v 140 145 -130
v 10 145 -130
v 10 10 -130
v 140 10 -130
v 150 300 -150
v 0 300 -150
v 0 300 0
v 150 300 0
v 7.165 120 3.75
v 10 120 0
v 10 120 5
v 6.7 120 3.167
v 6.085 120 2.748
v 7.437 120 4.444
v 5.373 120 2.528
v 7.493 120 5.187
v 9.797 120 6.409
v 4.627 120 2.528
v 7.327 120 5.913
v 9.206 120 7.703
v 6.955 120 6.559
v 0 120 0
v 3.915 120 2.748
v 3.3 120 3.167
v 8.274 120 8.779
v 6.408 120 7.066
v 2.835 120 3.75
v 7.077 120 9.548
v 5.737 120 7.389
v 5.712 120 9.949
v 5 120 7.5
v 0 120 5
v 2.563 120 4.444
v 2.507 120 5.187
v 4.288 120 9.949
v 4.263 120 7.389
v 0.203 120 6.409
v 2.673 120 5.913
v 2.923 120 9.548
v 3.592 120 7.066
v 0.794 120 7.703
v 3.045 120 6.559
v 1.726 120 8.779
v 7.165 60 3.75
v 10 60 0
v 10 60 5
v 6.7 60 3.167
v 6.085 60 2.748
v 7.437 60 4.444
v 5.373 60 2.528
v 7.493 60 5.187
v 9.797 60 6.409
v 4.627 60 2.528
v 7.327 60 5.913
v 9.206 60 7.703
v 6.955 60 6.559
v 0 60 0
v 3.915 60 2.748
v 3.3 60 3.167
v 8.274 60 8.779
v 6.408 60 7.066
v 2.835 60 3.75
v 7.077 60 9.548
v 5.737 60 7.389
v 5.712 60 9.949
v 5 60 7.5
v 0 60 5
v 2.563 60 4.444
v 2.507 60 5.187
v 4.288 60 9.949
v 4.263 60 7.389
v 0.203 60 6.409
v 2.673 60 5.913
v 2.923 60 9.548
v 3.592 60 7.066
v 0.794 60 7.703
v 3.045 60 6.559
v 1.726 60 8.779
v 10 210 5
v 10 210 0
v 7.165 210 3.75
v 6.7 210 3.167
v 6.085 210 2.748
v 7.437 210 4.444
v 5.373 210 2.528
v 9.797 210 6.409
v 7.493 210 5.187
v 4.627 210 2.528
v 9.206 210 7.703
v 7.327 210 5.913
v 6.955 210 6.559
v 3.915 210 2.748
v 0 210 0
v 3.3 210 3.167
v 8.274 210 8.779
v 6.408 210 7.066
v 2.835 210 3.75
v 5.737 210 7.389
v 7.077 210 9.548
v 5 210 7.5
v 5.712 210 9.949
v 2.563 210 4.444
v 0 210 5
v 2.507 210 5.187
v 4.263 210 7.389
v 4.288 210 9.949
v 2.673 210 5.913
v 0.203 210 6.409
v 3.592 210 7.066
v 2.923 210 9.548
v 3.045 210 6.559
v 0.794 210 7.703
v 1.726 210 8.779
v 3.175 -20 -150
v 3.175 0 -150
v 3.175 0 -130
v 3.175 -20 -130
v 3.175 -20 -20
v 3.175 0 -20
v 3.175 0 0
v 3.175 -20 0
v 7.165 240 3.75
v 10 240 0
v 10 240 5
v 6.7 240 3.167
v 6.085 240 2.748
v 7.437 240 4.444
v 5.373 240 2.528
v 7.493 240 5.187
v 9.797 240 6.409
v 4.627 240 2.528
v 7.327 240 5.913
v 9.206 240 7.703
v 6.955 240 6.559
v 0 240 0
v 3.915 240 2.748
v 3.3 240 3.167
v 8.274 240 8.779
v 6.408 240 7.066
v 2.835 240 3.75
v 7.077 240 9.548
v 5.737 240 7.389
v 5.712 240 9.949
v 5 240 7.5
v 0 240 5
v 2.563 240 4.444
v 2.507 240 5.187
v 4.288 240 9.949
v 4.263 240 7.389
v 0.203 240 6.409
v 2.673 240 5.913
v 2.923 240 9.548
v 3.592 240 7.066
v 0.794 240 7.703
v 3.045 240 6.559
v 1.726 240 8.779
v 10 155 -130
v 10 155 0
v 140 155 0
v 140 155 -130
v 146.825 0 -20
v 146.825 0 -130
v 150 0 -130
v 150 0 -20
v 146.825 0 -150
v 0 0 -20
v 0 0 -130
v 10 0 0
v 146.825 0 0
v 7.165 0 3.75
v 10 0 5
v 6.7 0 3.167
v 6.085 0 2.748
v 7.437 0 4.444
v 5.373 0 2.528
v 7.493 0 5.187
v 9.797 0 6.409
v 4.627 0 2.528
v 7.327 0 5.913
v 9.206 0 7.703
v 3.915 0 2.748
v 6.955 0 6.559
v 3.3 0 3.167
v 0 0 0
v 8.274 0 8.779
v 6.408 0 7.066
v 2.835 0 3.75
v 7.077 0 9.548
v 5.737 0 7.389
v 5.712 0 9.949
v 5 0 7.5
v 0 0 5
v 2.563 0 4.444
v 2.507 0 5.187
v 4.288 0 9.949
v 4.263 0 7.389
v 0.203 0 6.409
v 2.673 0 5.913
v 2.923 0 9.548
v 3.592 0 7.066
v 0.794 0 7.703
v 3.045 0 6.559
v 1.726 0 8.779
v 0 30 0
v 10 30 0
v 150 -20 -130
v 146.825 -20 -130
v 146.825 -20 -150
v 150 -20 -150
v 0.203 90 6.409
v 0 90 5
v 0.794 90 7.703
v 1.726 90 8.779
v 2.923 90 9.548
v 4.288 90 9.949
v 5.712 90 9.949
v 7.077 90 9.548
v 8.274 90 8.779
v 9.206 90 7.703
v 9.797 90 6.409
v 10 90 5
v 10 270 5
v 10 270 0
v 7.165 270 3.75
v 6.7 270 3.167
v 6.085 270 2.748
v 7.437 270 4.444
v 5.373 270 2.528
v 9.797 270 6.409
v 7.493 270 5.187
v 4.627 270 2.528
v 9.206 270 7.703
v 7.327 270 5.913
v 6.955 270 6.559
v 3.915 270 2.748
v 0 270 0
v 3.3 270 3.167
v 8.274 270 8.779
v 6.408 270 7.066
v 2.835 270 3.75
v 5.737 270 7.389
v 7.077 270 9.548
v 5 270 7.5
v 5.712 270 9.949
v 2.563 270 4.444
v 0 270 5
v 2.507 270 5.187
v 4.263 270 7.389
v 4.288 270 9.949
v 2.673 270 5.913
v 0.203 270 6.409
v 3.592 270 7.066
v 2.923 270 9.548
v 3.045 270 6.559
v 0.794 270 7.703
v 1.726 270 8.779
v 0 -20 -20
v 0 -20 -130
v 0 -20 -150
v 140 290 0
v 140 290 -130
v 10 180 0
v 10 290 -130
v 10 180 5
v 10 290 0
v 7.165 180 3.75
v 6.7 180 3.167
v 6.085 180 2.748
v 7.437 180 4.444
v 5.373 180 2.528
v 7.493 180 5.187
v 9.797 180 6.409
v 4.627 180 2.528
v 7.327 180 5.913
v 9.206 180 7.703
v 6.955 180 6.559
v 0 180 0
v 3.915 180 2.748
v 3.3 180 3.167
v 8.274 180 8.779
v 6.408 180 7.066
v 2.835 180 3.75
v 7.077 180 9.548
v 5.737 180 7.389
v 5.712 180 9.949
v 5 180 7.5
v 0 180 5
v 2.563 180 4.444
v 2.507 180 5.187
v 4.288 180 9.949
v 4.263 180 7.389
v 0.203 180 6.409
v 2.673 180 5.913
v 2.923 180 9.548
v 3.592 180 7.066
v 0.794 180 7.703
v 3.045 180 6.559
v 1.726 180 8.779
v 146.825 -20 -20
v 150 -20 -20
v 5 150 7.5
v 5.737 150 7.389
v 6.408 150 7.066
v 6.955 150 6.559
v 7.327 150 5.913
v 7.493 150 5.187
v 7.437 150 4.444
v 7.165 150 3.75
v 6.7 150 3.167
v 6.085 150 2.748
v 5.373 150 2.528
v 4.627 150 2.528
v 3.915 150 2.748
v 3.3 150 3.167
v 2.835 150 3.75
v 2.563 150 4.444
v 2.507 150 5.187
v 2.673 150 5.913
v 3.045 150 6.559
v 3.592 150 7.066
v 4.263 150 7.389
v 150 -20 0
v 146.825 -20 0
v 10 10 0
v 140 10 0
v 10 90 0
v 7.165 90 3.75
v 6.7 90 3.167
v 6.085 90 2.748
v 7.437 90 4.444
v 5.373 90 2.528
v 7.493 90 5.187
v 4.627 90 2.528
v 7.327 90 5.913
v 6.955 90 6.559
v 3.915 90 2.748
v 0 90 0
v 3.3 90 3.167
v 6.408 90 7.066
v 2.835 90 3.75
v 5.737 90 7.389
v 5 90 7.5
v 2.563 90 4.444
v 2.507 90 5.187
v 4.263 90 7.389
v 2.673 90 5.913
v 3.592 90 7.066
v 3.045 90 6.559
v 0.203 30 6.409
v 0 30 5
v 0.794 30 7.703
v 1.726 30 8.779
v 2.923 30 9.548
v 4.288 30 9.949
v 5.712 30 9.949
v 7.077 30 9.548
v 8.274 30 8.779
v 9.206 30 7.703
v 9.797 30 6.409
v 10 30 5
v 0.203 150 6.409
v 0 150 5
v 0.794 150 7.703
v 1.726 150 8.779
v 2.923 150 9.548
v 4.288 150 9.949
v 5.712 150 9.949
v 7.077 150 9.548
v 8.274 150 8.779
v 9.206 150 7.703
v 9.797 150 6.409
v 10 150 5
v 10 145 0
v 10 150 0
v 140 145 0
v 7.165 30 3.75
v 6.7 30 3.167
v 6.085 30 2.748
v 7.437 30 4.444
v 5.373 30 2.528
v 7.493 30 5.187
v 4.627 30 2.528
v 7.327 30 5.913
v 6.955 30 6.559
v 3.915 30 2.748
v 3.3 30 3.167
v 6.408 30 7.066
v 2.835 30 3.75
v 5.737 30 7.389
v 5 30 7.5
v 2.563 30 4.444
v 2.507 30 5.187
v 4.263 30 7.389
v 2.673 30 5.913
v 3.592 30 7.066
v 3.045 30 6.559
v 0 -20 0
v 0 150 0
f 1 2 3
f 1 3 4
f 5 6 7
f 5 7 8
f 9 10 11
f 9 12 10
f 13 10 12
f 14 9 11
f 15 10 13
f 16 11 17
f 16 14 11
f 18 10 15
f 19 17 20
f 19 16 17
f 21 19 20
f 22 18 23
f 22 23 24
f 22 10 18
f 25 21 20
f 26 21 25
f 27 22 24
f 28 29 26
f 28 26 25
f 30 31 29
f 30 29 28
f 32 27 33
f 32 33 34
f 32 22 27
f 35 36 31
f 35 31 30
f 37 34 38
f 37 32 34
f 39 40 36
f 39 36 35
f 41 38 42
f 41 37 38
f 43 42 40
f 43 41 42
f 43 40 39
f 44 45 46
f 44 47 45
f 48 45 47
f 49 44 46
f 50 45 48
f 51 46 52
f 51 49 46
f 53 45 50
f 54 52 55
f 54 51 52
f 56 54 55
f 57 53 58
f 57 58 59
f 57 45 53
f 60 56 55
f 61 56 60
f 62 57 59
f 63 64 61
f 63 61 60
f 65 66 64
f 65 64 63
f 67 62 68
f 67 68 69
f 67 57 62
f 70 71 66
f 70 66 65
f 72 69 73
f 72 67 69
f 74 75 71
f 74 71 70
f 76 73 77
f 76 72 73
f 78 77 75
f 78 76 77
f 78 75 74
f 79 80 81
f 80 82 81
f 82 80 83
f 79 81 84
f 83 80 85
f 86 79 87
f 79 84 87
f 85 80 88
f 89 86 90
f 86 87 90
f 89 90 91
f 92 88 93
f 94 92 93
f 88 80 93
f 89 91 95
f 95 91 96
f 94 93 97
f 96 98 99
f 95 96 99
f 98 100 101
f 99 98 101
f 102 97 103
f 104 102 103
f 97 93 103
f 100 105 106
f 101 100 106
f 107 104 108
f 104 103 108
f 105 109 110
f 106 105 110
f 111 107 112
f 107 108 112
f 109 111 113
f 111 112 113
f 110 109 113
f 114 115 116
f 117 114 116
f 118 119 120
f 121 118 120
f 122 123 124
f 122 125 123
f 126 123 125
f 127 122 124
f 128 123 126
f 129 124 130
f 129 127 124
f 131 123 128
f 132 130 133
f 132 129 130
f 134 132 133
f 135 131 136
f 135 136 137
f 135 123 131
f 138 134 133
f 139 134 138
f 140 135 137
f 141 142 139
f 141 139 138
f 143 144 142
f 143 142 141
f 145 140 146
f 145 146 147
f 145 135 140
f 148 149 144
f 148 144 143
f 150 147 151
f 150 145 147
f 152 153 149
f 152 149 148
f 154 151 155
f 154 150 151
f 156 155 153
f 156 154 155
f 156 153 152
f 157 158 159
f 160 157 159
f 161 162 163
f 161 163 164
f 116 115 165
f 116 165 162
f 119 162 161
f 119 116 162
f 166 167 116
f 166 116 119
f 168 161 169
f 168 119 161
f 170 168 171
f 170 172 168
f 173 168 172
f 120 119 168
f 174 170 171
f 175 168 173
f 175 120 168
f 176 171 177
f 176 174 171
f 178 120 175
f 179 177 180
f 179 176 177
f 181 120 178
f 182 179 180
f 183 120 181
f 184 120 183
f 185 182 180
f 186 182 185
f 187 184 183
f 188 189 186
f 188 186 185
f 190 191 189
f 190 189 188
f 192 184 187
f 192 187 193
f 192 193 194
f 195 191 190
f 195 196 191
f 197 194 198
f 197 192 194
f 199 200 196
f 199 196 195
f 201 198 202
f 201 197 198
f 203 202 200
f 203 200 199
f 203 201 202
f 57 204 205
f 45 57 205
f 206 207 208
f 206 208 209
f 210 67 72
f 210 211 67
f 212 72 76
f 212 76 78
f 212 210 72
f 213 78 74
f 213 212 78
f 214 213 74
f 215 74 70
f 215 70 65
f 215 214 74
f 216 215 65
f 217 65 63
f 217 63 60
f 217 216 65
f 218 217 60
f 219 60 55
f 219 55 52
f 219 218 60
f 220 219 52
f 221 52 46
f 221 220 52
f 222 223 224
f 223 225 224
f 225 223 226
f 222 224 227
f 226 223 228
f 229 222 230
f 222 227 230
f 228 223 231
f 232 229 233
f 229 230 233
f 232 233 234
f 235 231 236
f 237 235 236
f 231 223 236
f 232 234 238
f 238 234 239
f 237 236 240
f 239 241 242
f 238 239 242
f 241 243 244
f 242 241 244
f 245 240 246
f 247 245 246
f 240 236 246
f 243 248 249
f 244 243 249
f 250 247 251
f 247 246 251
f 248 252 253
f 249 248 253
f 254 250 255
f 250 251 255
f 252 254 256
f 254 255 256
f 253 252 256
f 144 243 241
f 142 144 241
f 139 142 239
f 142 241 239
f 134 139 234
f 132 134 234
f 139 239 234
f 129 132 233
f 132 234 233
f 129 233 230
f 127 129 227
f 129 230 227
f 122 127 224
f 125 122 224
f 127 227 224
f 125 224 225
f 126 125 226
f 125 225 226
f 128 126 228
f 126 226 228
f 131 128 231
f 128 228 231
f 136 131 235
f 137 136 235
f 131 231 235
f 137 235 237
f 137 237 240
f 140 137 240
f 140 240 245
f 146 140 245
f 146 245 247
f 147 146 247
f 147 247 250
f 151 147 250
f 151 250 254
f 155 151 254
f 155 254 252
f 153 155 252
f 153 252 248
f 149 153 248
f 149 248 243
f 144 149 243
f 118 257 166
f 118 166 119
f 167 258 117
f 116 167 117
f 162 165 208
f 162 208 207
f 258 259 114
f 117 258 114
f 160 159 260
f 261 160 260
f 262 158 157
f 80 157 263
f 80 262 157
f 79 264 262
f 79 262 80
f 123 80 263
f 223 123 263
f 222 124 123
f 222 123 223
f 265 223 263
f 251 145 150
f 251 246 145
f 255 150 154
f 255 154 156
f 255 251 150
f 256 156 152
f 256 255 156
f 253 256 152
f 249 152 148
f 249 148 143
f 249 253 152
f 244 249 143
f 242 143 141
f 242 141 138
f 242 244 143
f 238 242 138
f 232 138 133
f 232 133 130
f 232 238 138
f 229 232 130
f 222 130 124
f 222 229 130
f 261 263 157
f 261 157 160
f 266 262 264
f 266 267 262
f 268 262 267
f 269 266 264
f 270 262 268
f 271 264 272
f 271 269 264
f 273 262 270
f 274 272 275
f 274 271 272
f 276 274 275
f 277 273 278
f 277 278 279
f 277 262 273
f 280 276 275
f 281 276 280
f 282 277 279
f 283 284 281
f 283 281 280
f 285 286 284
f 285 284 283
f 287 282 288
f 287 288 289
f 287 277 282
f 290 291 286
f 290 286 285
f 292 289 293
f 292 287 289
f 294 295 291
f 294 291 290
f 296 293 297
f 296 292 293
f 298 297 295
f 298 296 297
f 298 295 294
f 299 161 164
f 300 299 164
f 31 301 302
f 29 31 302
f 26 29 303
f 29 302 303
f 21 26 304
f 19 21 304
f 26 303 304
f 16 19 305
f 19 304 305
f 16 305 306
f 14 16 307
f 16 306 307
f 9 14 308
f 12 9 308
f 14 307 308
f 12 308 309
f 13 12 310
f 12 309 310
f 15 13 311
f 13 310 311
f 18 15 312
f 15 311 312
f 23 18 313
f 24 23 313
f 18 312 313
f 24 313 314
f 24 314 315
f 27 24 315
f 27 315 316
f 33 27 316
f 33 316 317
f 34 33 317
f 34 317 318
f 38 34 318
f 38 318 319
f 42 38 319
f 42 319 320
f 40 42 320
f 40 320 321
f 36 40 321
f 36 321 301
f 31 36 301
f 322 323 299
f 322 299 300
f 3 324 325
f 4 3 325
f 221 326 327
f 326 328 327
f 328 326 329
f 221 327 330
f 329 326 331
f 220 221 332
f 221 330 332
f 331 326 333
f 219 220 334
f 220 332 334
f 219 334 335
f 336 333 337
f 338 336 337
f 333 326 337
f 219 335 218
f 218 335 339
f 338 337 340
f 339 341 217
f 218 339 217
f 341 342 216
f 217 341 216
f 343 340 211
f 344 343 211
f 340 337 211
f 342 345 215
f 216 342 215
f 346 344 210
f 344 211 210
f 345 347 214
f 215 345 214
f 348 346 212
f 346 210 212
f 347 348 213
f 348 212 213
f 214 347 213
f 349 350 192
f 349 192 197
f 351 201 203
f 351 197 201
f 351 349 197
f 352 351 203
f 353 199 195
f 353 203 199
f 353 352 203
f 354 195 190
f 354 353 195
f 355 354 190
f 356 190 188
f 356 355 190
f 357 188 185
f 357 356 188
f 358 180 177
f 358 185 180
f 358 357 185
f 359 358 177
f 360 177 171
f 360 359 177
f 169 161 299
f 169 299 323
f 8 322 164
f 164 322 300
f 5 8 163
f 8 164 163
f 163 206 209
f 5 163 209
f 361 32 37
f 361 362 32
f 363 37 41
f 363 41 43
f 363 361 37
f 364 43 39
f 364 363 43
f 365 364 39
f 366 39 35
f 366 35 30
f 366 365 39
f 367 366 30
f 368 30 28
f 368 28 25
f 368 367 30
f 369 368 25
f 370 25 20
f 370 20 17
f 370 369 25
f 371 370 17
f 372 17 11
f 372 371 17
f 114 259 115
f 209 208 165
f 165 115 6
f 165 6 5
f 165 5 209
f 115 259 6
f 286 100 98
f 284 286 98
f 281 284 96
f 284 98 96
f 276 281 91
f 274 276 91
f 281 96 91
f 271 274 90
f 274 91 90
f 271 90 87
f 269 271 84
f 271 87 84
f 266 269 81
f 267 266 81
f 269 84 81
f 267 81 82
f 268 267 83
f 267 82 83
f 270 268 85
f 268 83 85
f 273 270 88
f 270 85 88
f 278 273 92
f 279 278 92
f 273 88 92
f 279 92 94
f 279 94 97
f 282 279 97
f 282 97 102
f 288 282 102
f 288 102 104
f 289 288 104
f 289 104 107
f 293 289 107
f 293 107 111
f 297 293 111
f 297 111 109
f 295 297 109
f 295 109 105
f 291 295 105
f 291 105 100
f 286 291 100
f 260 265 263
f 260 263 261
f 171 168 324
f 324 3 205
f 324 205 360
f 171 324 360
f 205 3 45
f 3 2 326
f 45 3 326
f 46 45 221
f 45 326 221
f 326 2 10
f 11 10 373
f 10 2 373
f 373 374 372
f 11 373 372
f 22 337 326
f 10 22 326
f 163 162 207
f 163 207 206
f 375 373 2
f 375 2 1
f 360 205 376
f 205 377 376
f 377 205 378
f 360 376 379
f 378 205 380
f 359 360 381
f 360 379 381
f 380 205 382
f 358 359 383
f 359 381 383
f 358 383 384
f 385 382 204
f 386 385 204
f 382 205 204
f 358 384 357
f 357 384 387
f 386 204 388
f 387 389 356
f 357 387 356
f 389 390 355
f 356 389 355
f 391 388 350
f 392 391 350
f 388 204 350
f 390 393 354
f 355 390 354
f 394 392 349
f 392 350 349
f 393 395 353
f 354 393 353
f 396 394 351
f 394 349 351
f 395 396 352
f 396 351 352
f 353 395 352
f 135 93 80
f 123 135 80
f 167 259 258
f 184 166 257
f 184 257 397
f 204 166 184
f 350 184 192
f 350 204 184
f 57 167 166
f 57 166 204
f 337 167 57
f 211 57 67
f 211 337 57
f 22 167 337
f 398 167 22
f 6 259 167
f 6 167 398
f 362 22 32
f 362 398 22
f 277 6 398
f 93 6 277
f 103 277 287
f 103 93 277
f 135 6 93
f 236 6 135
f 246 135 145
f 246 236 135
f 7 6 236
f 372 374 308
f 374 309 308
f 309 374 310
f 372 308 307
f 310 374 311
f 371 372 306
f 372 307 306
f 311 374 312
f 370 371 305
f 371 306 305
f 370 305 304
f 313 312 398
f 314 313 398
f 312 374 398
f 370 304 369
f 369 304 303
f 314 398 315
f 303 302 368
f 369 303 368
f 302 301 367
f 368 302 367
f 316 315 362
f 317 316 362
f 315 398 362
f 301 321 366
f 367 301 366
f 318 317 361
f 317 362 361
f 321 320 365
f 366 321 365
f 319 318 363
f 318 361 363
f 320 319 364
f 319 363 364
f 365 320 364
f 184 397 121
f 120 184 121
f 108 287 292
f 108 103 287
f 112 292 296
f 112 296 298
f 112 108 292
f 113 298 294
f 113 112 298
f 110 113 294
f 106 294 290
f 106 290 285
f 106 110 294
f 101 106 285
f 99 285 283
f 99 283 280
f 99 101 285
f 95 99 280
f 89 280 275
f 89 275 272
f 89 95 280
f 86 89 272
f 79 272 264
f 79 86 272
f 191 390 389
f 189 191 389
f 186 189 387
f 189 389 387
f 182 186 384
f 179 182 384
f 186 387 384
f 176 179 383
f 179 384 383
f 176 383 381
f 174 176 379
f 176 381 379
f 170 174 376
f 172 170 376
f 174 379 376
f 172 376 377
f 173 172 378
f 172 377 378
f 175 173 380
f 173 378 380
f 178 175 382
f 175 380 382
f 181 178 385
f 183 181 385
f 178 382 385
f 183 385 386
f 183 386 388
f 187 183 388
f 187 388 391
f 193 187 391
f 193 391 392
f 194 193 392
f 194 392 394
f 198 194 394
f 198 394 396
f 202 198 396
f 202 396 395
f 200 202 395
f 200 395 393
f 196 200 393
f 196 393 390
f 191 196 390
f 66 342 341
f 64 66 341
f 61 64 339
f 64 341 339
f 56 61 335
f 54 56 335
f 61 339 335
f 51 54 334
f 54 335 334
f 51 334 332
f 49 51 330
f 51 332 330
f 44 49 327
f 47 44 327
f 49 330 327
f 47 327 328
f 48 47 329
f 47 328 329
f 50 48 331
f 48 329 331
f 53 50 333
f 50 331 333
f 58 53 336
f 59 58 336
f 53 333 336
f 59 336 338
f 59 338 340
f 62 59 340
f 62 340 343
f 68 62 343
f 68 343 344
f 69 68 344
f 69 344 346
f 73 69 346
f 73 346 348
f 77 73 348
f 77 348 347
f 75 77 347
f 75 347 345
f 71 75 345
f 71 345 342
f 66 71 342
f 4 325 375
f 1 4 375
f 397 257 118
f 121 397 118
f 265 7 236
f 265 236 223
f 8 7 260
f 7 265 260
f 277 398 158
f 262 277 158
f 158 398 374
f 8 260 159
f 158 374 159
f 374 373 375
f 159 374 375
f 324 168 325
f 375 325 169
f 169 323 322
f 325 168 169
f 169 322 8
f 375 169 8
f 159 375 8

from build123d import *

# Parameters (mm, degrees)
SKETCH1_W           = 150
SKETCH1_H           = 150
BOSS_EXTRUDE1_DEPTH = 300
SKETCH2_W           = 130
SKETCH2_H           = 135
CUT_EXTRUDE1_DEPTH  = 130
SKETCH3_W           = 10
SKETCH3_H           = 30
BOSS_EXTRUDE2_DEPTH = 10
SKETCH4_R           = 2.5
CUT_EXTRUDE2_DEPTH  = 344.365694268
FILLET1_RADIUS      = 5
FILLET1_LENGTH      = 30
FILLET2_RADIUS      = 5
FILLET2_LENGTH      = 30
FILLET3_RADIUS      = 5
FILLET3_LENGTH      = 30
FILLET4_RADIUS      = 5
FILLET4_LENGTH      = 30
FILLET5_RADIUS      = 5
FILLET5_LENGTH      = 30
SKETCH5_W           = 3.175
SKETCH5_H           = 20
BOSS_EXTRUDE3_DEPTH = 20


with BuildPart() as part:
    # Sketch1 → Boss-Extrude1 (new body)
    with BuildSketch(Plane(origin=(0, 0, 0), x_dir=(1, 0, 0), z_dir=(0, 1, 0))):
        with Locations((75, 75)):
            Rectangle(SKETCH1_W, SKETCH1_H)
    extrude(amount=BOSS_EXTRUDE1_DEPTH)

    # Sketch2 → Cut-Extrude1 (cut)
    with BuildSketch(Plane.XY):
        with Locations((75, 77.5)):
            Rectangle(SKETCH2_W, SKETCH2_H)
        with Locations((75, 222.5)):
            Rectangle(SKETCH2_W, SKETCH2_H)
    extrude(amount=-CUT_EXTRUDE1_DEPTH, mode=Mode.SUBTRACT)

    # Sketch3 → Boss-Extrude2 (add)
    with BuildSketch(Plane.ZY):
        with Locations((5, 75)):
            Rectangle(SKETCH3_W, SKETCH3_H)
        with Locations((5, 15)):
            Rectangle(SKETCH3_W, SKETCH3_H)
        with Locations((5, 135)):
            Rectangle(SKETCH3_W, SKETCH3_H)
        with Locations((5, 195)):
            Rectangle(SKETCH3_W, SKETCH3_H)
        with Locations((5, 255)):
            Rectangle(SKETCH3_W, SKETCH3_H)
    extrude(amount=-BOSS_EXTRUDE2_DEPTH)

    # Sketch4 → Cut-Extrude2 (cut, through all)
    with BuildSketch(Plane(origin=(0, 270, 0), x_dir=(1, 0, 0), z_dir=(0, 1, 0))):
        with Locations(Location((5, -5, 0), (0, 0, 270))):
            Circle(SKETCH4_R)
    extrude(amount=-CUT_EXTRUDE2_DEPTH, mode=Mode.SUBTRACT)

    # Fillet1: full round fillet: the end face becomes a half cylinder, R = half its width
    fillet1_face = Plane((5, 255, 10), x_dir=(0, 1, 0), z_dir=(0, 0, 1))  # on the end face: x along it, z out of the body
    fillet1_slab = fillet1_face.offset(-FILLET1_RADIUS / 2) * Box(FILLET1_LENGTH, 2 * FILLET1_RADIUS, FILLET1_RADIUS, mode=Mode.PRIVATE)  # the body's end, R deep
    fillet1_round = Plane((5, 255, 5), x_dir=(0, 0, 1), z_dir=(0, 1, 0)) * Cylinder(FILLET1_RADIUS, FILLET1_LENGTH, mode=Mode.PRIVATE)  # its axis R under the face
    add(fillet1_slab - fillet1_round, mode=Mode.SUBTRACT)

    # Fillet2: full round fillet: the end face becomes a half cylinder, R = half its width
    fillet2_face = Plane((5, 195, 10), x_dir=(0, 1, 0), z_dir=(0, 0, 1))  # on the end face: x along it, z out of the body
    fillet2_slab = fillet2_face.offset(-FILLET2_RADIUS / 2) * Box(FILLET2_LENGTH, 2 * FILLET2_RADIUS, FILLET2_RADIUS, mode=Mode.PRIVATE)  # the body's end, R deep
    fillet2_round = Plane((5, 195, 5), x_dir=(0, 0, 1), z_dir=(0, 1, 0)) * Cylinder(FILLET2_RADIUS, FILLET2_LENGTH, mode=Mode.PRIVATE)  # its axis R under the face
    add(fillet2_slab - fillet2_round, mode=Mode.SUBTRACT)

    # Fillet3: full round fillet: the end face becomes a half cylinder, R = half its width
    fillet3_face = Plane((5, 135, 10), x_dir=(0, 1, 0), z_dir=(0, 0, 1))  # on the end face: x along it, z out of the body
    fillet3_slab = fillet3_face.offset(-FILLET3_RADIUS / 2) * Box(FILLET3_LENGTH, 2 * FILLET3_RADIUS, FILLET3_RADIUS, mode=Mode.PRIVATE)  # the body's end, R deep
    fillet3_round = Plane((5, 135, 5), x_dir=(0, 0, 1), z_dir=(0, 1, 0)) * Cylinder(FILLET3_RADIUS, FILLET3_LENGTH, mode=Mode.PRIVATE)  # its axis R under the face
    add(fillet3_slab - fillet3_round, mode=Mode.SUBTRACT)

    # Fillet4: full round fillet: the end face becomes a half cylinder, R = half its width
    fillet4_face = Plane((5, 75, 10), x_dir=(0, 1, 0), z_dir=(0, 0, 1))  # on the end face: x along it, z out of the body
    fillet4_slab = fillet4_face.offset(-FILLET4_RADIUS / 2) * Box(FILLET4_LENGTH, 2 * FILLET4_RADIUS, FILLET4_RADIUS, mode=Mode.PRIVATE)  # the body's end, R deep
    fillet4_round = Plane((5, 75, 5), x_dir=(0, 0, 1), z_dir=(0, 1, 0)) * Cylinder(FILLET4_RADIUS, FILLET4_LENGTH, mode=Mode.PRIVATE)  # its axis R under the face
    add(fillet4_slab - fillet4_round, mode=Mode.SUBTRACT)

    # Fillet5: full round fillet: the end face becomes a half cylinder, R = half its width
    fillet5_face = Plane((5, 15, 10), x_dir=(0, 1, 0), z_dir=(0, 0, 1))  # on the end face: x along it, z out of the body
    fillet5_slab = fillet5_face.offset(-FILLET5_RADIUS / 2) * Box(FILLET5_LENGTH, 2 * FILLET5_RADIUS, FILLET5_RADIUS, mode=Mode.PRIVATE)  # the body's end, R deep
    fillet5_round = Plane((5, 15, 5), x_dir=(0, 0, 1), z_dir=(0, 1, 0)) * Cylinder(FILLET5_RADIUS, FILLET5_LENGTH, mode=Mode.PRIVATE)  # its axis R under the face
    add(fillet5_slab - fillet5_round, mode=Mode.SUBTRACT)

    # Sketch5 → Boss-Extrude3 (add)
    with BuildSketch(Plane.XZ):
        with Locations((1.5875, -140)):
            Rectangle(SKETCH5_W, SKETCH5_H)
        with Locations((1.5875, -10)):
            Rectangle(SKETCH5_W, SKETCH5_H)
        with Locations((148.4125, -10)):
            Rectangle(SKETCH5_W, SKETCH5_H)
        with Locations((148.4125, -140)):
            Rectangle(SKETCH5_W, SKETCH5_H)
    extrude(amount=BOSS_EXTRUDE3_DEPTH)


solid = part.part
